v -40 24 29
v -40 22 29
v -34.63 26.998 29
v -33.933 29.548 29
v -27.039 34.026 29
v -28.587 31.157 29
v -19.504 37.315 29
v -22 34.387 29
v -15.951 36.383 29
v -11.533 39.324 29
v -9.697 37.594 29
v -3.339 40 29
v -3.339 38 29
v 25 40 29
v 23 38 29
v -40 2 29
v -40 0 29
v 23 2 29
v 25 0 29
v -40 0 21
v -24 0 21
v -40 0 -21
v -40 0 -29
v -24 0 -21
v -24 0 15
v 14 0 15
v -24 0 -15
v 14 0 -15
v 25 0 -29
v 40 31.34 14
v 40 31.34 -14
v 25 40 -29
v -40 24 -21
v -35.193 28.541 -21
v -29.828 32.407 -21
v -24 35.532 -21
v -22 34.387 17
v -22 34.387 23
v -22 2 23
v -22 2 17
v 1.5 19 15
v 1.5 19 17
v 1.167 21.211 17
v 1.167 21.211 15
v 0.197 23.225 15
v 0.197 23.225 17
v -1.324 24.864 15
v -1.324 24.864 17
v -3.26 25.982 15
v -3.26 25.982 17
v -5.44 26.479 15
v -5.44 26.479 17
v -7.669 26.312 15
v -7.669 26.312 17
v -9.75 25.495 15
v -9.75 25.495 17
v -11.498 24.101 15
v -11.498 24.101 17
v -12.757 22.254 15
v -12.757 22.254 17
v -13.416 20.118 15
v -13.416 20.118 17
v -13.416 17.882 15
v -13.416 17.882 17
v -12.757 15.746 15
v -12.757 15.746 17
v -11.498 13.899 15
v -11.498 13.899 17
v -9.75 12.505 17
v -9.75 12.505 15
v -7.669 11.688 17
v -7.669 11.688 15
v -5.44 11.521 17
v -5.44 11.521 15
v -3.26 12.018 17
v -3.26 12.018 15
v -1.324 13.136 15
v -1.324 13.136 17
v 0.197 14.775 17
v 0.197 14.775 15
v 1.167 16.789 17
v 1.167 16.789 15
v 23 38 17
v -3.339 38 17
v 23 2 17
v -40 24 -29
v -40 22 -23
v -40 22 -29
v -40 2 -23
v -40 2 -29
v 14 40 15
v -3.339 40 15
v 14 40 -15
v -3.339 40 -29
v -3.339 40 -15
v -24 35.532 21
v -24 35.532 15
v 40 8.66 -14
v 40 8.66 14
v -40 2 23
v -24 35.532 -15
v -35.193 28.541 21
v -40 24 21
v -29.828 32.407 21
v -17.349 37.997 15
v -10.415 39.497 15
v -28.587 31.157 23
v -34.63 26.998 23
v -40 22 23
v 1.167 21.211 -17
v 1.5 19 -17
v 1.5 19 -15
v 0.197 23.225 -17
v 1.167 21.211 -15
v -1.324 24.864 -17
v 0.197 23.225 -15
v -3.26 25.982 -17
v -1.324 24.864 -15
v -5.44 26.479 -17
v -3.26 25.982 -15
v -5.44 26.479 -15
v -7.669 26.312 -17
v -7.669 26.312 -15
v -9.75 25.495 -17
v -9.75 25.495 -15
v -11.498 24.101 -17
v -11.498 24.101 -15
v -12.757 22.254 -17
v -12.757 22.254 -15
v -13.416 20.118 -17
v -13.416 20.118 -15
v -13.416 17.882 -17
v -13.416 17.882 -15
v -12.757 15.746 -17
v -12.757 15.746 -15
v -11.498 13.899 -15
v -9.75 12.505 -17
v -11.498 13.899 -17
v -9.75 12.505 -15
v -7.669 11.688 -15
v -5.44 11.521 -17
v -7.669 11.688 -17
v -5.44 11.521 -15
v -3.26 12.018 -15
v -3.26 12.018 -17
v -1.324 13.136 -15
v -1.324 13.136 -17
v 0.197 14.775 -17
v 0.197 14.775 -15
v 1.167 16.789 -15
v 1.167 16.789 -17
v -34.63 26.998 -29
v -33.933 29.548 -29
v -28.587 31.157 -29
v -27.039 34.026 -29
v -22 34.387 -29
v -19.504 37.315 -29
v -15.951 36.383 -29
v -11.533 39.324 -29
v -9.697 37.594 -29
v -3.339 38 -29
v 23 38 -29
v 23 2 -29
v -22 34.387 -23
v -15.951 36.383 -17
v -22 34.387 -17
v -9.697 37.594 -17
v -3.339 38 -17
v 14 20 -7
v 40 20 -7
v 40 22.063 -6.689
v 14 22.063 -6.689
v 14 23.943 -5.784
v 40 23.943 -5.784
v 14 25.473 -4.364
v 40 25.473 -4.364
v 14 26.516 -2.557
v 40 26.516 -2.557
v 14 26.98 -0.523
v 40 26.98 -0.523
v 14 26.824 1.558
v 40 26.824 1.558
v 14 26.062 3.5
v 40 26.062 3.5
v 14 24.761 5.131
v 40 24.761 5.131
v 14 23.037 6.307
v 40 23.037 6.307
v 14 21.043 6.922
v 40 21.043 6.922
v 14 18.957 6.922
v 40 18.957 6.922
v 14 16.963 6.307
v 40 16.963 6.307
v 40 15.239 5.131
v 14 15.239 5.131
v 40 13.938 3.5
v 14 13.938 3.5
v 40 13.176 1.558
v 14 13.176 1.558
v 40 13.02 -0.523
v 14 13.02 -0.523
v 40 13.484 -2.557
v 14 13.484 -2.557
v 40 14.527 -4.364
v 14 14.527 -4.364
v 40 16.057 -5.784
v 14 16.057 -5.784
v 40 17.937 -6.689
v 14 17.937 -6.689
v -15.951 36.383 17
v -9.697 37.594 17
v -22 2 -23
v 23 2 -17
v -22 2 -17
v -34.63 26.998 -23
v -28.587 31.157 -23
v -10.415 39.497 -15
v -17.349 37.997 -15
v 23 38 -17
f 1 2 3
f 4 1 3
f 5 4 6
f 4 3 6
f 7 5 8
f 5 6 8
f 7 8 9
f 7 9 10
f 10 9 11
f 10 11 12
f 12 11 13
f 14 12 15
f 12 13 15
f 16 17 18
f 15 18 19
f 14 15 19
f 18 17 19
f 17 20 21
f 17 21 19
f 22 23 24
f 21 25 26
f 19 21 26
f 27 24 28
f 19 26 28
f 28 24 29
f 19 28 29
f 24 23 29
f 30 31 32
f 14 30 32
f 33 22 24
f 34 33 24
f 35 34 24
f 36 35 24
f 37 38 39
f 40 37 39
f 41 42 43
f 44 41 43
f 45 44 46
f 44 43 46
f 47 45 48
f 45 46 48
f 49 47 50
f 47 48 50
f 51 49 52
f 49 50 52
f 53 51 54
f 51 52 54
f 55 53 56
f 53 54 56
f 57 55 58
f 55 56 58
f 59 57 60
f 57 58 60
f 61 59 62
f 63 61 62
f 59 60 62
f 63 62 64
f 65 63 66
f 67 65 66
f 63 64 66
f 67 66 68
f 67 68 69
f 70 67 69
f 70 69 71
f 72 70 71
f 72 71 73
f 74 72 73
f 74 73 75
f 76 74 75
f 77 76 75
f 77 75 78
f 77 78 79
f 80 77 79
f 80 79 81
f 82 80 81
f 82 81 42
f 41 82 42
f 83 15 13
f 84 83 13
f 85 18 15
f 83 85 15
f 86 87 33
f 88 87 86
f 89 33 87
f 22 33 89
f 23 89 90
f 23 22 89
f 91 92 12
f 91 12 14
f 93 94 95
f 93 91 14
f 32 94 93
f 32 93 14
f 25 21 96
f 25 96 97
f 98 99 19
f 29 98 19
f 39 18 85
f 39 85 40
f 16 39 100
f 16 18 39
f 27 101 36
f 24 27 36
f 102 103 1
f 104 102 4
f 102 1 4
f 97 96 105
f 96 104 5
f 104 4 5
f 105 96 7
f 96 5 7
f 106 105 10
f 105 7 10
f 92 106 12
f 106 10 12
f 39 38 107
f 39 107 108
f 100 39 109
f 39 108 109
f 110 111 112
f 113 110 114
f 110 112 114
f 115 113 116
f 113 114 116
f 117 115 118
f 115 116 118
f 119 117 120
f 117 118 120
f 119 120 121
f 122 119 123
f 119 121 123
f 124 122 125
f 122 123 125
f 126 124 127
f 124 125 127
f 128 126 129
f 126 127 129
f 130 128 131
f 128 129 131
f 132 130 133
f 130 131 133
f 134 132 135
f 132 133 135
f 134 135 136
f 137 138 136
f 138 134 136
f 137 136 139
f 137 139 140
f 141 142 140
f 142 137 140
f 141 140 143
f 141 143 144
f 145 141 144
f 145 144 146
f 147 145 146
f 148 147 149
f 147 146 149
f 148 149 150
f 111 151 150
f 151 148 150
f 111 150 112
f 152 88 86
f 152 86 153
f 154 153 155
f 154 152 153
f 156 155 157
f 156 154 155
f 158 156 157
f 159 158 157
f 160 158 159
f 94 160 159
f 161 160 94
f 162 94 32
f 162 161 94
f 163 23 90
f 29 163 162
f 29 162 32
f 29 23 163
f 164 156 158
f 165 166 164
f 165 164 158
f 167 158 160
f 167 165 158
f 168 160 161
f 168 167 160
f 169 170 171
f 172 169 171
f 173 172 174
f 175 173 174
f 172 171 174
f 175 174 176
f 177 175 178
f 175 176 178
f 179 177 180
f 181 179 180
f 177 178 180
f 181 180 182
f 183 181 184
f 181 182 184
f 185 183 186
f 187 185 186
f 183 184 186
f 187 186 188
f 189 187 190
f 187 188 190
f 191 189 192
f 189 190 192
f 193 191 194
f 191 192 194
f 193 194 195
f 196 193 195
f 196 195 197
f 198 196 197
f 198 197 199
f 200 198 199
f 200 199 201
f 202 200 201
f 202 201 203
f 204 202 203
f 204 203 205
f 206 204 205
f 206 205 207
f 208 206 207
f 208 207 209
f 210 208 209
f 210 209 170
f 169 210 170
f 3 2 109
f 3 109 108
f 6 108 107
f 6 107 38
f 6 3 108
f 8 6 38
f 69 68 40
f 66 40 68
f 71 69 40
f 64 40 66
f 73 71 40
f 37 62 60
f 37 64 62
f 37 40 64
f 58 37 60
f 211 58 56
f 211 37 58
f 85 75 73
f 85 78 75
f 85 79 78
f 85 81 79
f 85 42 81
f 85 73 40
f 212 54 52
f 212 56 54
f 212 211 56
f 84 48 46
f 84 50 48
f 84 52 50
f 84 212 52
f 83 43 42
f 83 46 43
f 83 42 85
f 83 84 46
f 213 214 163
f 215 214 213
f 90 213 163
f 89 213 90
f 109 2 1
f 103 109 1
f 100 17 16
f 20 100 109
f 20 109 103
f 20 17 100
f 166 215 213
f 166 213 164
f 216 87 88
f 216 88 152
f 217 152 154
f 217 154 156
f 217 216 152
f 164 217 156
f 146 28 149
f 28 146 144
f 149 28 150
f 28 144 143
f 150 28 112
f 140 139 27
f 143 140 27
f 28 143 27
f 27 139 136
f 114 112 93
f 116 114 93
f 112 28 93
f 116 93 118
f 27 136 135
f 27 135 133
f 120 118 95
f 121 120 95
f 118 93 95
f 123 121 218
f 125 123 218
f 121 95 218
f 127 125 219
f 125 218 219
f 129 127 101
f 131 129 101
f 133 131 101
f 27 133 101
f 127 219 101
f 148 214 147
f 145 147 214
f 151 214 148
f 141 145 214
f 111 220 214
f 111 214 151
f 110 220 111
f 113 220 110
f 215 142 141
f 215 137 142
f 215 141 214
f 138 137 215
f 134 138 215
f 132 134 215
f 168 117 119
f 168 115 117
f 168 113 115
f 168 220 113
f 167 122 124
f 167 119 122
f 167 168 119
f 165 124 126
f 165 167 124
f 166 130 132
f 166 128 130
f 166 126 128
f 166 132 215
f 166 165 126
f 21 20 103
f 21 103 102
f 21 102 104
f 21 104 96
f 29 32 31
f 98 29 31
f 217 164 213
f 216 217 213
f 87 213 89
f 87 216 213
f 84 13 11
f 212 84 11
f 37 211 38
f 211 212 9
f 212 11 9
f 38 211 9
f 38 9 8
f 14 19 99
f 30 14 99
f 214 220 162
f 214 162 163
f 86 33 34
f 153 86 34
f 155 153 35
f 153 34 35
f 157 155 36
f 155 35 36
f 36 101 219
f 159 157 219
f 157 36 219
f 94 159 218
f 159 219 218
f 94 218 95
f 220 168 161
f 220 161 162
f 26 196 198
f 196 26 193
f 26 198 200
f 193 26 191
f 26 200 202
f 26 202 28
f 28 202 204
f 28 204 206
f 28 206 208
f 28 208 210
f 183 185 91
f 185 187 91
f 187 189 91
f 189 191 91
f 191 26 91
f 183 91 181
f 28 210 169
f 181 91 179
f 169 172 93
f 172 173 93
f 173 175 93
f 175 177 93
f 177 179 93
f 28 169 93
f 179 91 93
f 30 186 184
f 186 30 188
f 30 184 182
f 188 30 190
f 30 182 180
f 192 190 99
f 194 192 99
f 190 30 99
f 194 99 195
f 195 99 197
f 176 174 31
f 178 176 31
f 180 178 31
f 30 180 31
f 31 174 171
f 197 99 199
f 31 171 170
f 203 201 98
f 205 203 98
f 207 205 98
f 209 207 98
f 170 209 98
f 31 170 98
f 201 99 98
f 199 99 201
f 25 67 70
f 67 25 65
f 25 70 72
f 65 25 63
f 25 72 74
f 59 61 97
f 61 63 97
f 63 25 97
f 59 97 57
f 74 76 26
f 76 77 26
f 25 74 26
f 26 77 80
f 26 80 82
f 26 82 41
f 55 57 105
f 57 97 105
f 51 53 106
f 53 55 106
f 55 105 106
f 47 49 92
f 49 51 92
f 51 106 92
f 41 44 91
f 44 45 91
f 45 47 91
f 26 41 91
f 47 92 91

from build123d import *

# Parameters (mm, degrees)
SKETCH1_W           = 80
SKETCH1_H           = 58
BOSS_EXTRUDE1_DEPTH = 40
SKETCH2_R           = 7.5
CUT_EXTRUDE1_DEPTH  = 95
CUT_EXTRUDE4_DEPTH  = 95
SKETCH7_W           = 36.66060556
SKETCH7_H           = 15
SKETCH7_W_2         = 17.33939444
CUT_EXTRUDE5_DEPTH  = 95
SKETCH8_W           = 16
SKETCH8_H           = 42
CUT_EXTRUDE6_DEPTH  = 95
SKETCH9_R           = 7
CUT_EXTRUDE7_DEPTH  = 95
SKETCH15_R          = 7.5
CUT_EXTRUDE18_DEPTH = 12
CUT_EXTRUDE19_DEPTH = 6
CUT_EXTRUDE20_START = -12
SKETCH19_R          = 7.5
CUT_EXTRUDE20_DEPTH = 12
CUT_EXTRUDE21_START = -6
CUT_EXTRUDE21_DEPTH = 6


with BuildPart() as part:
    # Sketch1 → Boss-Extrude1 (new body)
    with BuildSketch(Plane(origin=(0, 0, 0), x_dir=(1, 0, 0), z_dir=(0, 1, 0))):
        Rectangle(SKETCH1_W, SKETCH1_H)
    extrude(amount=BOSS_EXTRUDE1_DEPTH)

    # Sketch2 → Cut-Extrude1 (cut)
    with BuildSketch(Plane.XY.offset(29)):
        with Locations((-6, 19)):
            Circle(SKETCH2_R)
        Polygon((25, 0), (40, 0), (40, 8.660254038), align=None)
        Polygon((25, 40), (40, 40), (40, 31.339745962), align=None)
    extrude(amount=-CUT_EXTRUDE1_DEPTH, mode=Mode.SUBTRACT)

    # Sketch4 → Cut-Extrude4 (cut)
    with BuildSketch(Plane.XY.offset(29)):
        with BuildLine():
            ThreePointArc((-40, 24), (-23.33939444, 35.82575695), (-3.33939444, 40))
            Line((-3.33939444, 40), (-40, 40))
            Line((-40, 40), (-40, 24))
        make_face()
    extrude(amount=-CUT_EXTRUDE4_DEPTH, mode=Mode.SUBTRACT)

    # Sketch7 → Cut-Extrude5 (cut)
    with BuildSketch(Plane(origin=(0, 40, 0), x_dir=(1, 0, 0), z_dir=(0, 1, 0))):
        with Locations((-21.66969722, -7.5)):
            Rectangle(SKETCH7_W, SKETCH7_H)
        with Locations((-21.66969722, 7.5)):
            Rectangle(SKETCH7_W, SKETCH7_H)
        with Locations((5.33030278, 7.5)):
            Rectangle(SKETCH7_W_2, SKETCH7_H)
        with Locations((5.33030278, -7.5)):
            Rectangle(SKETCH7_W_2, SKETCH7_H)
        Polygon((40, 14), (40, 29), (25, 29), align=None)
        Polygon((40, -29), (25, -29), (40, -14), align=None)
    extrude(amount=-CUT_EXTRUDE5_DEPTH, mode=Mode.SUBTRACT)

    # Sketch8 → Cut-Extrude6 (cut)
    with BuildSketch(Plane(origin=(0, 40, 0), x_dir=(1, 0, 0), z_dir=(0, 1, 0))):
        with Locations((-32, 0)):
            Rectangle(SKETCH8_W, SKETCH8_H)
    extrude(amount=-CUT_EXTRUDE6_DEPTH, mode=Mode.SUBTRACT)

    # Sketch9 → Cut-Extrude7 (cut)
    with BuildSketch(Plane(origin=(40, 0, 0), x_dir=(0, 0, -1), z_dir=(1, 0, 0))):
        with Locations((0, 20)):
            Circle(SKETCH9_R)
    extrude(amount=-CUT_EXTRUDE7_DEPTH, mode=Mode.SUBTRACT)

    # Sketch15 → Cut-Extrude18 (cut)
    with BuildSketch(Plane.XY.offset(29)):
        with BuildLine():
            Line((23, 2), (23, 38))
            Line((23, 38), (-3.339394, 38))
            ThreePointArc((-3.339394, 38), (-12.842943372, 37.088517575), (-22, 34.387302143))
            Line((-22, 34.387302143), (-22, 2))
            Line((-22, 2), (23, 2))
        make_face()
        with Locations((-6, 19)):
            Circle(SKETCH15_R, mode=Mode.SUBTRACT)
    extrude(amount=-CUT_EXTRUDE18_DEPTH, mode=Mode.SUBTRACT)

    # Sketch18 → Cut-Extrude19 (cut)
    with BuildSketch(Plane.XY.offset(29)):
        with BuildLine():
            Line((-22, 34.387302143), (-22, 2))
            Line((-22, 2), (-40, 2))
            Line((-40, 2), (-40, 22))
            ThreePointArc((-40, 22), (-31.684948122, 29.18894981), (-22, 34.387302143))
        make_face()
    extrude(amount=-CUT_EXTRUDE19_DEPTH, mode=Mode.SUBTRACT)

    # Sketch19 → Cut-Extrude20 (cut)
    with BuildSketch(Plane(origin=(0, 0, -29), x_dir=(-1, 0, 0), z_dir=(0, 0, -1)).offset(CUT_EXTRUDE20_START)):
        with BuildLine():
            Line((3.339394, 38), (-23, 38))
            Line((-23, 38), (-23, 2))
            Line((-23, 2), (22, 2))
            Line((22, 2), (22, 34.387302143))
            ThreePointArc((22, 34.387302143), (12.842943372, 37.088517575), (3.339394, 38))
        make_face()
        with Locations(Location((6, 19, 0), (0, 0, 180))):
            Circle(SKETCH19_R, mode=Mode.SUBTRACT)
    extrude(amount=CUT_EXTRUDE20_DEPTH, mode=Mode.SUBTRACT)

    # Sketch20 → Cut-Extrude21 (cut)
    with BuildSketch(Plane(origin=(0, 0, -29), x_dir=(-1, 0, 0), z_dir=(0, 0, -1)).offset(CUT_EXTRUDE21_START)):
        with BuildLine():
            Line((22, 34.387302143), (22, 2))
            Line((22, 2), (40, 2))
            Line((40, 2), (40, 22))
            ThreePointArc((40, 22), (31.684948122, 29.18894981), (22, 34.387302143))
        make_face()
    extrude(amount=CUT_EXTRUDE21_DEPTH, mode=Mode.SUBTRACT)


solid = part.part
